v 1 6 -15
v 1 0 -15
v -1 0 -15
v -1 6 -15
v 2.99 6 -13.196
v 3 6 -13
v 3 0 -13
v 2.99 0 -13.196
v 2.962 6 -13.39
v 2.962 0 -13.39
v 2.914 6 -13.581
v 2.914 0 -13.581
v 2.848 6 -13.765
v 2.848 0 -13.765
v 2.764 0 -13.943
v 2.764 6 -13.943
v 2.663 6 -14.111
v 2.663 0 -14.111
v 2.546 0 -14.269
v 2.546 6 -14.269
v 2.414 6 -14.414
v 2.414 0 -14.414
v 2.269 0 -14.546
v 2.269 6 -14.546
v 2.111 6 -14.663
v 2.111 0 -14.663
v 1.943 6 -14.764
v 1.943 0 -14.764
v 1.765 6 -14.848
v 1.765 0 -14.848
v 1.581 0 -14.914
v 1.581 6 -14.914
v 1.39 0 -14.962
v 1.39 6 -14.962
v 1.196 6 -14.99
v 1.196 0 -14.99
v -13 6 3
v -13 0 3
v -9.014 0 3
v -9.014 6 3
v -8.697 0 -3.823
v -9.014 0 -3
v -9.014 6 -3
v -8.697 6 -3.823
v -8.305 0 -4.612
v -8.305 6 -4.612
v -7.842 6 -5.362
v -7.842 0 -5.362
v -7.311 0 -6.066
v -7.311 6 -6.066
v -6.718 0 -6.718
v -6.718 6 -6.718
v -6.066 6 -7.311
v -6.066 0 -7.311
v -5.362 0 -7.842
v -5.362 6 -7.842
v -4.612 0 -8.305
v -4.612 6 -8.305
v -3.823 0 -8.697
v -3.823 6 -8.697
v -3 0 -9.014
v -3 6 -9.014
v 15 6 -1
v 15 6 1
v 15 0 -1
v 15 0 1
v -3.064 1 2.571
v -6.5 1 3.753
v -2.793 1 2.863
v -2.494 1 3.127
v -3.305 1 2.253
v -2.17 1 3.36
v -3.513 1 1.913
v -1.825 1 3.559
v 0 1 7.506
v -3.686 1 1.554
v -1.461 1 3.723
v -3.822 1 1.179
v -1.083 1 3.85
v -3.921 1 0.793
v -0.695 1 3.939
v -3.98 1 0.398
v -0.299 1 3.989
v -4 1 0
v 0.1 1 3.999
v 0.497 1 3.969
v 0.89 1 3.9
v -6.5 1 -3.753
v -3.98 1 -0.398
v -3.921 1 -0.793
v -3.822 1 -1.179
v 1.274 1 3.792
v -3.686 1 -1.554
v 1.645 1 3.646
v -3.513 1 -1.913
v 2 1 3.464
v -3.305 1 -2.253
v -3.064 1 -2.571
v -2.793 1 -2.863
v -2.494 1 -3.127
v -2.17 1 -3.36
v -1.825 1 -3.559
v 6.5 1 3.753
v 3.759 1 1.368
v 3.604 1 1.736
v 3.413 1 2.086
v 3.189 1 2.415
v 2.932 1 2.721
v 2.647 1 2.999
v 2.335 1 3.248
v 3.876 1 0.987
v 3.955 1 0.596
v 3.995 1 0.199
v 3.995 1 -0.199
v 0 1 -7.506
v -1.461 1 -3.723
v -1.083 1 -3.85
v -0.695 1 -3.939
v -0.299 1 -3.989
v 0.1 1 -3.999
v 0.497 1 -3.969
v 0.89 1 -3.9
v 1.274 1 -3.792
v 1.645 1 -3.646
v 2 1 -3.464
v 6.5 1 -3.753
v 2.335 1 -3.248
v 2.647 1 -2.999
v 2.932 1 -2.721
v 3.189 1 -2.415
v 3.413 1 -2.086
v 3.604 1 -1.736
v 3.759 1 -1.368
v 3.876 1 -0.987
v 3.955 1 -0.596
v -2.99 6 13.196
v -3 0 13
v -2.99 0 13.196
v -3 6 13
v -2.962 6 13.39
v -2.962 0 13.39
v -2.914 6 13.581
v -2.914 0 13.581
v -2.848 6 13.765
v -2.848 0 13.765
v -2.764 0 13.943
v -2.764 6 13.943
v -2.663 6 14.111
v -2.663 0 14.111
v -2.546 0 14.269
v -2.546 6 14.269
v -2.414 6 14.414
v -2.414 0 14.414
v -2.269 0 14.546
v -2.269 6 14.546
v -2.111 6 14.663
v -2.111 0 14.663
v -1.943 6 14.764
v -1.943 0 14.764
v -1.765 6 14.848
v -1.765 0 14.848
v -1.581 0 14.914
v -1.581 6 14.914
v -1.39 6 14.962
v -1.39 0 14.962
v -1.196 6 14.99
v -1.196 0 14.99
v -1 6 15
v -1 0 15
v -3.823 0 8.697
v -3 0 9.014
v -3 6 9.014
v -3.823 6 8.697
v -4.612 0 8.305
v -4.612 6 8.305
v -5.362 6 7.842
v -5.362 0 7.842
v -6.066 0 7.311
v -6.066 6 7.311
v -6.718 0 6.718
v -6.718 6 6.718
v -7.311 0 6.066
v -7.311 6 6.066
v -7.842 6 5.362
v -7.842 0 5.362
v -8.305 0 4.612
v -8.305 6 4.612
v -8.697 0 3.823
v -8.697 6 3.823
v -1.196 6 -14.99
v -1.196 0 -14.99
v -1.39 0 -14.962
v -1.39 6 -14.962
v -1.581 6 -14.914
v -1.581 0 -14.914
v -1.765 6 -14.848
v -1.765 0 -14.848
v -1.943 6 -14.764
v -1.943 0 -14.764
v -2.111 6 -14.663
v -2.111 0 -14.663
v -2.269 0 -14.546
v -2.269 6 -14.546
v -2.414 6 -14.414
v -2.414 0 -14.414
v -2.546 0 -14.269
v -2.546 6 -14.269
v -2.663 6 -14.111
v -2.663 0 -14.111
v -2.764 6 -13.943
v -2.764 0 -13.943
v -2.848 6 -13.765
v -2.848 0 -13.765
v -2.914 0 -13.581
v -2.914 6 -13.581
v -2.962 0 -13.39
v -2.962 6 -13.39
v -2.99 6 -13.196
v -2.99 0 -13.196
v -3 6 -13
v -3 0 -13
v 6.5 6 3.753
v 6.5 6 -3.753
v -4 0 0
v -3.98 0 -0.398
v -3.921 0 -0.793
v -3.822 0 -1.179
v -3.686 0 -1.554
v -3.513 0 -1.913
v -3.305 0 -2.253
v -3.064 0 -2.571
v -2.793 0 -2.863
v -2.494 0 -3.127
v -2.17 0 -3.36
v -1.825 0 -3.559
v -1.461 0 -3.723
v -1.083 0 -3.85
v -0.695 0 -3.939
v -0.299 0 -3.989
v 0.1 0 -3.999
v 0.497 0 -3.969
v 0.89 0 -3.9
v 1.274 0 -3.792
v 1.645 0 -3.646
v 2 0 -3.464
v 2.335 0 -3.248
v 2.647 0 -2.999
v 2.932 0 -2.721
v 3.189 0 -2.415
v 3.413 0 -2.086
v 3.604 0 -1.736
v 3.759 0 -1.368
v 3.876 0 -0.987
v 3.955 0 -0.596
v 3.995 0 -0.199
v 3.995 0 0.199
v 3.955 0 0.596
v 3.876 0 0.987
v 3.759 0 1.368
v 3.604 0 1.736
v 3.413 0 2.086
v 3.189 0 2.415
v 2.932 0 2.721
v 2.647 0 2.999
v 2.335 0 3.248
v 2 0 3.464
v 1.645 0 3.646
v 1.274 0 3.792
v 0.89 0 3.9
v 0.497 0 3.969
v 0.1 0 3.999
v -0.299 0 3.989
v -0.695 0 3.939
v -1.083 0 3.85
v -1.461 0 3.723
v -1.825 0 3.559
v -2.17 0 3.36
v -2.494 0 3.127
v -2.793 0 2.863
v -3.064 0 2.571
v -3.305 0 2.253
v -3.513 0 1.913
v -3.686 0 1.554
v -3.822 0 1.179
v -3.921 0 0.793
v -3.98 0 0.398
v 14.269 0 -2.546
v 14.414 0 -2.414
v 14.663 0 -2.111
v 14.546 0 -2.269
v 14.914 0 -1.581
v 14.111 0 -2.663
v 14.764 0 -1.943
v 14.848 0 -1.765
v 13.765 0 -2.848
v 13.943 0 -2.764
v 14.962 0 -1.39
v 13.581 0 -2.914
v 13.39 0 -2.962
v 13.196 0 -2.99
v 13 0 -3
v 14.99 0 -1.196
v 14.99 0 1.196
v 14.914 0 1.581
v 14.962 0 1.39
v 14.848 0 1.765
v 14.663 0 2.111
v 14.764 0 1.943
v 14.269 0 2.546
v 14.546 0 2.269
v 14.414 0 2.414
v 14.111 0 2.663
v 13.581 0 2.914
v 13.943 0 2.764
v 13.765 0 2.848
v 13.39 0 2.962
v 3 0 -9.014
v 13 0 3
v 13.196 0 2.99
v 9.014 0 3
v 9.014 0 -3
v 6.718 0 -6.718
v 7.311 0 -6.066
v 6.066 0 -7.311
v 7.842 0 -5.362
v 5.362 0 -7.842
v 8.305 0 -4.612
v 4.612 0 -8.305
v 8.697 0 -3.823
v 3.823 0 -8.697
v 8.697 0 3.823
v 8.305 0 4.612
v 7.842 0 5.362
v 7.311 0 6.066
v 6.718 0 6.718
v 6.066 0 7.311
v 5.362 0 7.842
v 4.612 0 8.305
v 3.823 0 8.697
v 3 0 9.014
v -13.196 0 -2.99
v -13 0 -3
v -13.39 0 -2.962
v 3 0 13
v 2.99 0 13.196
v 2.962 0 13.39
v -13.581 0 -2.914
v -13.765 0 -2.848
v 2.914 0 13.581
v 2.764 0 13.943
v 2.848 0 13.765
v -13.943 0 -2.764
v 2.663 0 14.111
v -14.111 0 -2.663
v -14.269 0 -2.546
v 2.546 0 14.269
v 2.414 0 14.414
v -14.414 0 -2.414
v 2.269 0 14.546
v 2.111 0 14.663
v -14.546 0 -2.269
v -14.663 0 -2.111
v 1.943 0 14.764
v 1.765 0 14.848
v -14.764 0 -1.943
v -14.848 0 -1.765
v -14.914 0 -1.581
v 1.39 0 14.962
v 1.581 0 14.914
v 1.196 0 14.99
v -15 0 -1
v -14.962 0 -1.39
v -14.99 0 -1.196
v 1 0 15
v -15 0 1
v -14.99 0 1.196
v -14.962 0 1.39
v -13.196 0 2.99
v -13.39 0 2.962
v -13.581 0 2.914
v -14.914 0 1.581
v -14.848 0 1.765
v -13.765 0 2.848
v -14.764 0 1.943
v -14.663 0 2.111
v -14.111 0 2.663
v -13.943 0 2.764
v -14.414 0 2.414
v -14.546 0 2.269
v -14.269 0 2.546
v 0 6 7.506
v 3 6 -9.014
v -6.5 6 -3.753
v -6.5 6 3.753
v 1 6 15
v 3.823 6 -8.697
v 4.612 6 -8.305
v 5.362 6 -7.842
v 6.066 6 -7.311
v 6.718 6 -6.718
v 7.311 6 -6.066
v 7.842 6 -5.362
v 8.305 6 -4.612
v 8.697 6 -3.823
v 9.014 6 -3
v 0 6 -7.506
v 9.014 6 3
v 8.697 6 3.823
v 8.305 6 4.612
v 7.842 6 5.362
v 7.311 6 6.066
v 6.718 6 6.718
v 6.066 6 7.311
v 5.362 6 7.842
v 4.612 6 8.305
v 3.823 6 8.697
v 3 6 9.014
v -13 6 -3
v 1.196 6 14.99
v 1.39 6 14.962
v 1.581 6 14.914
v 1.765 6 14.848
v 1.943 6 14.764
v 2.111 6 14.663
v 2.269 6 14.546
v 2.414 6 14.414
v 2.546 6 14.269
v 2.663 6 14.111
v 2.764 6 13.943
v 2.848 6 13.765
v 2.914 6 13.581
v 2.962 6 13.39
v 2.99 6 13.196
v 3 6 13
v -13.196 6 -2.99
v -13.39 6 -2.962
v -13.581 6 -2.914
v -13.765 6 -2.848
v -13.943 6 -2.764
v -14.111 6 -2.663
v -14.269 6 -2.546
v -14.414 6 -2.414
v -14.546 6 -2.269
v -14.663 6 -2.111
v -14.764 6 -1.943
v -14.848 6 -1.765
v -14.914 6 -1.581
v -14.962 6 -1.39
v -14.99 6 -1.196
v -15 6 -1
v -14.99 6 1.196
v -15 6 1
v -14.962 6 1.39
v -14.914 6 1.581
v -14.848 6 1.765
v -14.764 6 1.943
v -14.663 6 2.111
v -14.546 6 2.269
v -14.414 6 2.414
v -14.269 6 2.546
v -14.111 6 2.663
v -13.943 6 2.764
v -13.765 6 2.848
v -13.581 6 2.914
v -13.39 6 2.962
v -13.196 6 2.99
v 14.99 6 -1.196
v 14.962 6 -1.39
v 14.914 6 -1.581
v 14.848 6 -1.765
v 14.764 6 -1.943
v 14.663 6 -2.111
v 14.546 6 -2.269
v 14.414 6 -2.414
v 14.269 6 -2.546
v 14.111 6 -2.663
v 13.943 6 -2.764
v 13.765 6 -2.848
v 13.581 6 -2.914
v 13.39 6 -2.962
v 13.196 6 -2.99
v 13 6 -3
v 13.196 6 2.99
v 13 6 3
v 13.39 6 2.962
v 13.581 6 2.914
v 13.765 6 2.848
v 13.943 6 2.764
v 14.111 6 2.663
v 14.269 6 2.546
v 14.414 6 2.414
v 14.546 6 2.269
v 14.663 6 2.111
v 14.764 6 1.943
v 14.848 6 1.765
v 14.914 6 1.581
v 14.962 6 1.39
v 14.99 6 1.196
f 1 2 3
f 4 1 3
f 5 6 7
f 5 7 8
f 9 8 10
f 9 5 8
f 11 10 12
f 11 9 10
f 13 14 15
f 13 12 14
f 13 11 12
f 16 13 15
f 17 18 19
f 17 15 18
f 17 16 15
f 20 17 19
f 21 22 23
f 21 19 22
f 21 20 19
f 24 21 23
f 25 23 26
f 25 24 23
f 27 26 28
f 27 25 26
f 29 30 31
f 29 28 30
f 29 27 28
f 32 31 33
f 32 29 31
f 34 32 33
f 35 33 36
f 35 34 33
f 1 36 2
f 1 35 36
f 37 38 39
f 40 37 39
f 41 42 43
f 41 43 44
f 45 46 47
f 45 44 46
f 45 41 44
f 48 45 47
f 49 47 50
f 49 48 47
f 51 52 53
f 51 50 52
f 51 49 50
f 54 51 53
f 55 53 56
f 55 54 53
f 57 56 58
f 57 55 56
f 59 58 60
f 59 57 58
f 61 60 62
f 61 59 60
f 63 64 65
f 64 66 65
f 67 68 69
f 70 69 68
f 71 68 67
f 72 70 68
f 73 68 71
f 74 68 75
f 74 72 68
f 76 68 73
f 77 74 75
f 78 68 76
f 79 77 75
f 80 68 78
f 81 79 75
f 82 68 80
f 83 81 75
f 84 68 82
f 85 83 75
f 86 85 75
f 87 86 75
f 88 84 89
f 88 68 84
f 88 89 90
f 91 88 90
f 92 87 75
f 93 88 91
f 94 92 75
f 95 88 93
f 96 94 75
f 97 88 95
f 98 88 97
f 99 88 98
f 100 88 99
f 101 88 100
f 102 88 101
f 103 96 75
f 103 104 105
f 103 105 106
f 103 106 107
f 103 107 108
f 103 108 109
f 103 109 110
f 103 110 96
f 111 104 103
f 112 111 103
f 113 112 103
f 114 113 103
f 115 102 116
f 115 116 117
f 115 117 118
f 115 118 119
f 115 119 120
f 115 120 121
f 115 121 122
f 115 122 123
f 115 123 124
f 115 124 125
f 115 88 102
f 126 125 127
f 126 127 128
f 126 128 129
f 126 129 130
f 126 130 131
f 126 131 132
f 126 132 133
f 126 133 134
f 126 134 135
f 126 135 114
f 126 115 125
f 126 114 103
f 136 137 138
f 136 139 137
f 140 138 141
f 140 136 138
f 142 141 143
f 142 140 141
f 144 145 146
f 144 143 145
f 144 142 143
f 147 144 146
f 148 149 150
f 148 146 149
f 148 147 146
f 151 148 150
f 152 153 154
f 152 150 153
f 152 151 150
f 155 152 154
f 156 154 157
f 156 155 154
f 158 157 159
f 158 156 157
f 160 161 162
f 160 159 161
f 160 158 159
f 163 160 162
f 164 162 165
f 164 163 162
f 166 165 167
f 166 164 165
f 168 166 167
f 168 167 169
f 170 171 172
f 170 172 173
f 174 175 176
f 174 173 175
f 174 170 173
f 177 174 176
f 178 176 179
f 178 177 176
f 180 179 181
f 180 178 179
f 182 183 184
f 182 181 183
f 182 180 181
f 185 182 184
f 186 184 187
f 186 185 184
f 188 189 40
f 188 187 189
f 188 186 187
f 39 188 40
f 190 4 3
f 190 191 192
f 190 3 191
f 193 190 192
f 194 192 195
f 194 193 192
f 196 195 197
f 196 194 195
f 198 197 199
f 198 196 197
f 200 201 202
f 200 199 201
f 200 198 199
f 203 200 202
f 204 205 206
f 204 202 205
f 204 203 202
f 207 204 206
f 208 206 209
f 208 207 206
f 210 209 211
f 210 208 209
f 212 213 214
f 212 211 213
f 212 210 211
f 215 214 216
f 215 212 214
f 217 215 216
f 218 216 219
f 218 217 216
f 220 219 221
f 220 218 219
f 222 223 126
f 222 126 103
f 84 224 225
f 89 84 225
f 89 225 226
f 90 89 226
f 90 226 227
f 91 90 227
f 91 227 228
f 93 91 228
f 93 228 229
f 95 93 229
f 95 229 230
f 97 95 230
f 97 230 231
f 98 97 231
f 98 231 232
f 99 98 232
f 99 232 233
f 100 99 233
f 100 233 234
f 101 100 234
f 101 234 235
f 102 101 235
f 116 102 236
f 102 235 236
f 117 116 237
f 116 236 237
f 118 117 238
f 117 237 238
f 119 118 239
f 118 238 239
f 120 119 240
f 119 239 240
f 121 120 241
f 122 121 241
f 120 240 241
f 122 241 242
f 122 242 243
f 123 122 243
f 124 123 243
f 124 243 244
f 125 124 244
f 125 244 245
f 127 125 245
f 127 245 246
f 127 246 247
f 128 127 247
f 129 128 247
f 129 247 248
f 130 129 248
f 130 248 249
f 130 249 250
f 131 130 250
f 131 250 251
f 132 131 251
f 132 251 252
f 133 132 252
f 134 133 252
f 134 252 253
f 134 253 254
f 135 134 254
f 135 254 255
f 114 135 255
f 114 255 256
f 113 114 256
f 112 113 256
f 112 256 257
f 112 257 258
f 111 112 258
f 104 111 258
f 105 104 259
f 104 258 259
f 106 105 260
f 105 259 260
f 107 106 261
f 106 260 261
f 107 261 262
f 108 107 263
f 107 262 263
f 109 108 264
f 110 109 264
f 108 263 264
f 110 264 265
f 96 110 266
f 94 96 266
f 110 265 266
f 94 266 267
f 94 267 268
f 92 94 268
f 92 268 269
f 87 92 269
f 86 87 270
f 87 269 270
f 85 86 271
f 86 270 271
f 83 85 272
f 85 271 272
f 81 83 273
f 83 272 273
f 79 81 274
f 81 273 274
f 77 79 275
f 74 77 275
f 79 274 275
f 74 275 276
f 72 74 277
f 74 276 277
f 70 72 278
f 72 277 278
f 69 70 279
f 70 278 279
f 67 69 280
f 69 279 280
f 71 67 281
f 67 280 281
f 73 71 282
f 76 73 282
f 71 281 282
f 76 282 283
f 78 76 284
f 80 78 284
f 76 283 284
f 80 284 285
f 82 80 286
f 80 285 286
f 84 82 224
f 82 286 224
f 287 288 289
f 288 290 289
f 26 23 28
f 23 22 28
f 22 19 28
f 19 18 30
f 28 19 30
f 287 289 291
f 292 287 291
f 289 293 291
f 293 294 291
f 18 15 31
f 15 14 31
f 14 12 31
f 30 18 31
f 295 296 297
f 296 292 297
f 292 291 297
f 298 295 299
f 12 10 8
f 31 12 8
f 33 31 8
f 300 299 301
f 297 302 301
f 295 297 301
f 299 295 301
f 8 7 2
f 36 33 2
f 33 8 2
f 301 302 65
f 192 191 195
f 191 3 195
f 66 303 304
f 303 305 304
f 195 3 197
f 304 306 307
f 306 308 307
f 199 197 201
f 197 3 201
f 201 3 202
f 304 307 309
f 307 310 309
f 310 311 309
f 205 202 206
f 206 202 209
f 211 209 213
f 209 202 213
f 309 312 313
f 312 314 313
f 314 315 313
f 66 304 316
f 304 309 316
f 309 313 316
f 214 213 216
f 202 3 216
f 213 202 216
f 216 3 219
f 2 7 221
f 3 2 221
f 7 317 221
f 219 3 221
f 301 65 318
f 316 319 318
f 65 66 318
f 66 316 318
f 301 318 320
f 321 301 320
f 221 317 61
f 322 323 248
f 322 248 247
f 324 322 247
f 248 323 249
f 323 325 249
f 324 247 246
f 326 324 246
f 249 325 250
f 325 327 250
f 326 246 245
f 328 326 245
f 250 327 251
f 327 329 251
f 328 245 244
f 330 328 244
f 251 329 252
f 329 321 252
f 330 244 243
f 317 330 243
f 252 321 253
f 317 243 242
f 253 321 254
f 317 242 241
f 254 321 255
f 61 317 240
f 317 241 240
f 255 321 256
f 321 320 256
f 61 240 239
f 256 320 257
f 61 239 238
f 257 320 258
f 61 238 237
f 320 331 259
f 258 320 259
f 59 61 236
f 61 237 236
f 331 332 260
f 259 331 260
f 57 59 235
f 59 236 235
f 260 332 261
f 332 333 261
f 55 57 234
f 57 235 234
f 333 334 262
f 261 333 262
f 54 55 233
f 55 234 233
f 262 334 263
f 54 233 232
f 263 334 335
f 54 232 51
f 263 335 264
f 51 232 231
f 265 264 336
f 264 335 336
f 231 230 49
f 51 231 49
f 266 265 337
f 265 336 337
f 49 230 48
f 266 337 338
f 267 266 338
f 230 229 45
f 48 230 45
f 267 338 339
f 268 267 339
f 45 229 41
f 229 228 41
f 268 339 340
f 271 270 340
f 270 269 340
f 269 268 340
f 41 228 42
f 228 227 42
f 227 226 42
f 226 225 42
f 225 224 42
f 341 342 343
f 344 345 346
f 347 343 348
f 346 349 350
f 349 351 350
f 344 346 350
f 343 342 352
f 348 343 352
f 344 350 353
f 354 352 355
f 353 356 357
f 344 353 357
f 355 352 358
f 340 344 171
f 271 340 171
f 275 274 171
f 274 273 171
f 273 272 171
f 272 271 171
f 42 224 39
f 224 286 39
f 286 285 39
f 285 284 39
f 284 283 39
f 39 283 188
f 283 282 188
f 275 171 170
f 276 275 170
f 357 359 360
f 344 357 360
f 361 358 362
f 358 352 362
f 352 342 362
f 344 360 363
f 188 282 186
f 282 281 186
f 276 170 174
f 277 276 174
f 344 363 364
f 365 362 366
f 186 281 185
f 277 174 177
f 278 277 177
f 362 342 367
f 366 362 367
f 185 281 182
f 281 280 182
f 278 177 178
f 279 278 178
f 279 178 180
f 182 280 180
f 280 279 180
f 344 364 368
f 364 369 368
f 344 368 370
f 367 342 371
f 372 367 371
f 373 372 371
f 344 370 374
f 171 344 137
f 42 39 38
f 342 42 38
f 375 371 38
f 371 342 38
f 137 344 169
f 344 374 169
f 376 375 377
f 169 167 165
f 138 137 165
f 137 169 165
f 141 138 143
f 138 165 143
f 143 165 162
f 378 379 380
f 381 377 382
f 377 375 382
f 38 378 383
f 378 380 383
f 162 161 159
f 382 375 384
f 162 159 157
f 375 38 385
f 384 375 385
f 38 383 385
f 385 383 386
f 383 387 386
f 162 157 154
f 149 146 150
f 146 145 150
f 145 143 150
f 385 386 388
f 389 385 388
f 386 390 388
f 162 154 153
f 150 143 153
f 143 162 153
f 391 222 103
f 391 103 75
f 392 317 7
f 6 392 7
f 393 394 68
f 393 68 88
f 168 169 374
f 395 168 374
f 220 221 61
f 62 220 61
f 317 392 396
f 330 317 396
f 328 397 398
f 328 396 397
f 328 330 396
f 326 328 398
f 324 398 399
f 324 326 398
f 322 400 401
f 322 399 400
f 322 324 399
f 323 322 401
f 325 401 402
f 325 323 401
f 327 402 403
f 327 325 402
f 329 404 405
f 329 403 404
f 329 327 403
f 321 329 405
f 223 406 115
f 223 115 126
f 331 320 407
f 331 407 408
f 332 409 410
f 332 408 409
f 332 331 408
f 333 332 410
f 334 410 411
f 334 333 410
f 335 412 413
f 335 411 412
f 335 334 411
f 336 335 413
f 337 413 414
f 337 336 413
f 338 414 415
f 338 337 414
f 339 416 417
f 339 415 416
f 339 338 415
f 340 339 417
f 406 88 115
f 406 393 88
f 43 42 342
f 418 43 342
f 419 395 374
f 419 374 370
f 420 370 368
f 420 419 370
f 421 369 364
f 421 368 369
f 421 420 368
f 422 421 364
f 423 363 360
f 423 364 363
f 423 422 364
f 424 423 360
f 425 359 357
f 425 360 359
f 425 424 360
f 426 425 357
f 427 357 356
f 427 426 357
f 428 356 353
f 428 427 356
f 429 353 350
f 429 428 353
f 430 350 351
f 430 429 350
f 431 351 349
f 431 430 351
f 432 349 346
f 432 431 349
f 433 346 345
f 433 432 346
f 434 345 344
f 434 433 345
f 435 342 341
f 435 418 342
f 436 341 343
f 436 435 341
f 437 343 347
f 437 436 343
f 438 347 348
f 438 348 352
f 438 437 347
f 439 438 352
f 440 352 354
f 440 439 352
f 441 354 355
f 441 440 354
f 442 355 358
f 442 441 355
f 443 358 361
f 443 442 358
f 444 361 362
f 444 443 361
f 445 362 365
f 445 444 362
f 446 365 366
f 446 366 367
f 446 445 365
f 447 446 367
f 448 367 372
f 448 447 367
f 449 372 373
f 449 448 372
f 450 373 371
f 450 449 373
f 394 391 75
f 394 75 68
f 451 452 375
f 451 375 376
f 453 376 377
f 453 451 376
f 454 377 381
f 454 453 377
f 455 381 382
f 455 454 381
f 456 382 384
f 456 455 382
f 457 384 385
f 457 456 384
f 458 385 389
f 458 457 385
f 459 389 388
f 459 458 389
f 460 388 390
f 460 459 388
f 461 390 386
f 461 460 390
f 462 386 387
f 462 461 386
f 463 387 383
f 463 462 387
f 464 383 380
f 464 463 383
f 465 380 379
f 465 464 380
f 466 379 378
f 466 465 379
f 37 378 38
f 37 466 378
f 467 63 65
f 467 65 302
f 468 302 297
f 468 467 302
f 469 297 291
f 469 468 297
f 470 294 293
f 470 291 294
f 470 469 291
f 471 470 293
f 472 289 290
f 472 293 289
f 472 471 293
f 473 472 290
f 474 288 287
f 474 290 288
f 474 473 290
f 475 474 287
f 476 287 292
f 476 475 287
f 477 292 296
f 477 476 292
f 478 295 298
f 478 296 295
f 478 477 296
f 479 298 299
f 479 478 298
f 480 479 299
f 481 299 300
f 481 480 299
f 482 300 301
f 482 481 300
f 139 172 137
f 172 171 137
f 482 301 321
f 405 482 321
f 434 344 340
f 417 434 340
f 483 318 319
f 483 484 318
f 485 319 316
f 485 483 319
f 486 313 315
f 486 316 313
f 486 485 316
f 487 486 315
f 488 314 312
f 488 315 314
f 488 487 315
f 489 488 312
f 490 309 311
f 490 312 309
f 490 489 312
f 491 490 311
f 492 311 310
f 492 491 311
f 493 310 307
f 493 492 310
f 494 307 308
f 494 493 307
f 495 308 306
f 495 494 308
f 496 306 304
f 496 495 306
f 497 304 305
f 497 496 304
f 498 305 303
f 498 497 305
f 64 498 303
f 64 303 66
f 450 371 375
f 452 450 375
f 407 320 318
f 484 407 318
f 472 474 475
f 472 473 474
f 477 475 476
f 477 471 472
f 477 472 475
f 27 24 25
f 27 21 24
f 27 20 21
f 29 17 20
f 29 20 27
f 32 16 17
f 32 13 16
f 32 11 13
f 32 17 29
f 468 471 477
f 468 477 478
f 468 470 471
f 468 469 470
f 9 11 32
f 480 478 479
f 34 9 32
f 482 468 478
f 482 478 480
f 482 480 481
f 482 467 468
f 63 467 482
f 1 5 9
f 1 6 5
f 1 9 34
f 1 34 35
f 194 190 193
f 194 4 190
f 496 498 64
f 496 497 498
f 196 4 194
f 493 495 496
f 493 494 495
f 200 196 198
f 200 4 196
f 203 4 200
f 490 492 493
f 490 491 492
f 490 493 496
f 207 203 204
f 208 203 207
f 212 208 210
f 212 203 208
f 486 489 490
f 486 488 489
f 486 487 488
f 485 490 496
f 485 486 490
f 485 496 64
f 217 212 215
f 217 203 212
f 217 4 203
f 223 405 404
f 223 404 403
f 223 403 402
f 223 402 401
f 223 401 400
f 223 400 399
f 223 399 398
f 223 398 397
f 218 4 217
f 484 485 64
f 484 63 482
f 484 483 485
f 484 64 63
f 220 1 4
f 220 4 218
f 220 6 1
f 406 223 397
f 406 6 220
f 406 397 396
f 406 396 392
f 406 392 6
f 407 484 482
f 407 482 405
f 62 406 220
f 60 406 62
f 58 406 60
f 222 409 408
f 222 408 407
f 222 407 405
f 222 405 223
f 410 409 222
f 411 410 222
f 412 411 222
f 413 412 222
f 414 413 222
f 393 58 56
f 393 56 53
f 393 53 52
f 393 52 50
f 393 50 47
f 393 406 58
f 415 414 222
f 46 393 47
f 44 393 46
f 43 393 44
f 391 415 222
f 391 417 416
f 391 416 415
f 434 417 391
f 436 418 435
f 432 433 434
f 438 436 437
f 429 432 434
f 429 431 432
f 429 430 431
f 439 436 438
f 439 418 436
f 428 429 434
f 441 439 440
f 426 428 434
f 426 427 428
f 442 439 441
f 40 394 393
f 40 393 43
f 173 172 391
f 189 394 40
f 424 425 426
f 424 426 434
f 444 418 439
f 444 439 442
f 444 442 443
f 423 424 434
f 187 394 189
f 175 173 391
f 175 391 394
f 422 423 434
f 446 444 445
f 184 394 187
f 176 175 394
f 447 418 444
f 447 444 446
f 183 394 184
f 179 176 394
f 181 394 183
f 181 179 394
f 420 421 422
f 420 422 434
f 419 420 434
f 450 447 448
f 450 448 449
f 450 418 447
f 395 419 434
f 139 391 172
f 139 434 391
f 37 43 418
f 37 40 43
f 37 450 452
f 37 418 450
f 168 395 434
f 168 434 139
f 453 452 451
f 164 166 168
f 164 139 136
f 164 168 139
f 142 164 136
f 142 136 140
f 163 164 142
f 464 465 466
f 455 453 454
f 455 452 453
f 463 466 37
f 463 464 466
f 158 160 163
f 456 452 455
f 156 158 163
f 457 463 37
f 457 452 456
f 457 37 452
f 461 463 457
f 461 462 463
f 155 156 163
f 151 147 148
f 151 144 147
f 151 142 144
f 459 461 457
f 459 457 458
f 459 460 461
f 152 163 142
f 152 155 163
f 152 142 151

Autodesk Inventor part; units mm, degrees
ref_plane "YZ Plane" through (0, 0, 0) normal (1, 0, 0) x (0, 1, 0)
ref_plane "XZ Plane" through (0, 0, 0) normal (0, 1, 0) x (-1, 0, 0)
ref_plane "XY Plane" through (0, 0, 0) normal (0, 0, 1) x (1, 0, 0)
sketch "Sketch1" plane through (0, 0, 0) normal (0, 1, 0) x (-1, 0, 0)
  circle A0 centre (0, 0) radius 9.5
  line L0 (3, 15) -> (-3, 15)
  line L1 (-3, -15) -> (3, -15)
  line L2 (-15, 3) -> (-15, -3)
  line L3 (15, -3) -> (15, 3)
  line L4 (3, -15) -> (3, -9.0139)
  line L5 (3, 9.0139) -> (3, 15)
  line L6 (15, 3) -> (9.0139, 3)
  line L7 (-9.0139, 3) -> (-15, 3)
  line L8 (-3, 15) -> (-3, 9.0139)
  line L9 (-3, -9.0139) -> (-3, -15)
  line L10 (-15, -3) -> (-9.0139, -3)
  line L11 (9.0139, -3) -> (15, -3)
  circle A1 centre (0, 0) radius 4
  point P0 (15, 0)
  point P1 (0, -15)
  point P2 (0, 15)
  point P3 (-15, 0)
  point P4 (9.5, 0)
  dimension "d0" = 19
  dimension "d2" = 6
  dimension "d7" = 5.5
  dimension "d10" = 8
extrude "Extrusion1" add sketch "Sketch1" along normal blind 6
fillet "Fillet1" radius 2 8 edges at (3, 3, 15) (-3, 3, 15) (-15, 3, 3) (-15, 3, -3) (-3, 3, -15) (3, 3, -15) (15, 3, -3) (15, 3, 3)
sketch "Sketch2" plane through (0, 6, 0) normal (0, 1, 0) x (1, 0, 0)
  line L0 (-6.5, 3.7528) -> (0, 7.5056)
  line L1 (0, 7.5056) -> (6.5, 3.7528)
  line L2 (6.5, 3.7528) -> (6.5, -3.7528)
  line L3 (6.5, -3.7528) -> (0, -7.5056)
  line L4 (0, -7.5056) -> (-6.5, -3.7528)
  line L5 (-6.5, -3.7528) -> (-6.5, 3.7528)
  line L6 (-15, 1) -> (-15, -1) projected
  point P0 (0, 0)
  point P1 (0, 0)
  dimension "d6" = 13
extrude "Extrusion2" cut sketch "Sketch2" against normal blind 5
properties part number "Wing_Nut"
